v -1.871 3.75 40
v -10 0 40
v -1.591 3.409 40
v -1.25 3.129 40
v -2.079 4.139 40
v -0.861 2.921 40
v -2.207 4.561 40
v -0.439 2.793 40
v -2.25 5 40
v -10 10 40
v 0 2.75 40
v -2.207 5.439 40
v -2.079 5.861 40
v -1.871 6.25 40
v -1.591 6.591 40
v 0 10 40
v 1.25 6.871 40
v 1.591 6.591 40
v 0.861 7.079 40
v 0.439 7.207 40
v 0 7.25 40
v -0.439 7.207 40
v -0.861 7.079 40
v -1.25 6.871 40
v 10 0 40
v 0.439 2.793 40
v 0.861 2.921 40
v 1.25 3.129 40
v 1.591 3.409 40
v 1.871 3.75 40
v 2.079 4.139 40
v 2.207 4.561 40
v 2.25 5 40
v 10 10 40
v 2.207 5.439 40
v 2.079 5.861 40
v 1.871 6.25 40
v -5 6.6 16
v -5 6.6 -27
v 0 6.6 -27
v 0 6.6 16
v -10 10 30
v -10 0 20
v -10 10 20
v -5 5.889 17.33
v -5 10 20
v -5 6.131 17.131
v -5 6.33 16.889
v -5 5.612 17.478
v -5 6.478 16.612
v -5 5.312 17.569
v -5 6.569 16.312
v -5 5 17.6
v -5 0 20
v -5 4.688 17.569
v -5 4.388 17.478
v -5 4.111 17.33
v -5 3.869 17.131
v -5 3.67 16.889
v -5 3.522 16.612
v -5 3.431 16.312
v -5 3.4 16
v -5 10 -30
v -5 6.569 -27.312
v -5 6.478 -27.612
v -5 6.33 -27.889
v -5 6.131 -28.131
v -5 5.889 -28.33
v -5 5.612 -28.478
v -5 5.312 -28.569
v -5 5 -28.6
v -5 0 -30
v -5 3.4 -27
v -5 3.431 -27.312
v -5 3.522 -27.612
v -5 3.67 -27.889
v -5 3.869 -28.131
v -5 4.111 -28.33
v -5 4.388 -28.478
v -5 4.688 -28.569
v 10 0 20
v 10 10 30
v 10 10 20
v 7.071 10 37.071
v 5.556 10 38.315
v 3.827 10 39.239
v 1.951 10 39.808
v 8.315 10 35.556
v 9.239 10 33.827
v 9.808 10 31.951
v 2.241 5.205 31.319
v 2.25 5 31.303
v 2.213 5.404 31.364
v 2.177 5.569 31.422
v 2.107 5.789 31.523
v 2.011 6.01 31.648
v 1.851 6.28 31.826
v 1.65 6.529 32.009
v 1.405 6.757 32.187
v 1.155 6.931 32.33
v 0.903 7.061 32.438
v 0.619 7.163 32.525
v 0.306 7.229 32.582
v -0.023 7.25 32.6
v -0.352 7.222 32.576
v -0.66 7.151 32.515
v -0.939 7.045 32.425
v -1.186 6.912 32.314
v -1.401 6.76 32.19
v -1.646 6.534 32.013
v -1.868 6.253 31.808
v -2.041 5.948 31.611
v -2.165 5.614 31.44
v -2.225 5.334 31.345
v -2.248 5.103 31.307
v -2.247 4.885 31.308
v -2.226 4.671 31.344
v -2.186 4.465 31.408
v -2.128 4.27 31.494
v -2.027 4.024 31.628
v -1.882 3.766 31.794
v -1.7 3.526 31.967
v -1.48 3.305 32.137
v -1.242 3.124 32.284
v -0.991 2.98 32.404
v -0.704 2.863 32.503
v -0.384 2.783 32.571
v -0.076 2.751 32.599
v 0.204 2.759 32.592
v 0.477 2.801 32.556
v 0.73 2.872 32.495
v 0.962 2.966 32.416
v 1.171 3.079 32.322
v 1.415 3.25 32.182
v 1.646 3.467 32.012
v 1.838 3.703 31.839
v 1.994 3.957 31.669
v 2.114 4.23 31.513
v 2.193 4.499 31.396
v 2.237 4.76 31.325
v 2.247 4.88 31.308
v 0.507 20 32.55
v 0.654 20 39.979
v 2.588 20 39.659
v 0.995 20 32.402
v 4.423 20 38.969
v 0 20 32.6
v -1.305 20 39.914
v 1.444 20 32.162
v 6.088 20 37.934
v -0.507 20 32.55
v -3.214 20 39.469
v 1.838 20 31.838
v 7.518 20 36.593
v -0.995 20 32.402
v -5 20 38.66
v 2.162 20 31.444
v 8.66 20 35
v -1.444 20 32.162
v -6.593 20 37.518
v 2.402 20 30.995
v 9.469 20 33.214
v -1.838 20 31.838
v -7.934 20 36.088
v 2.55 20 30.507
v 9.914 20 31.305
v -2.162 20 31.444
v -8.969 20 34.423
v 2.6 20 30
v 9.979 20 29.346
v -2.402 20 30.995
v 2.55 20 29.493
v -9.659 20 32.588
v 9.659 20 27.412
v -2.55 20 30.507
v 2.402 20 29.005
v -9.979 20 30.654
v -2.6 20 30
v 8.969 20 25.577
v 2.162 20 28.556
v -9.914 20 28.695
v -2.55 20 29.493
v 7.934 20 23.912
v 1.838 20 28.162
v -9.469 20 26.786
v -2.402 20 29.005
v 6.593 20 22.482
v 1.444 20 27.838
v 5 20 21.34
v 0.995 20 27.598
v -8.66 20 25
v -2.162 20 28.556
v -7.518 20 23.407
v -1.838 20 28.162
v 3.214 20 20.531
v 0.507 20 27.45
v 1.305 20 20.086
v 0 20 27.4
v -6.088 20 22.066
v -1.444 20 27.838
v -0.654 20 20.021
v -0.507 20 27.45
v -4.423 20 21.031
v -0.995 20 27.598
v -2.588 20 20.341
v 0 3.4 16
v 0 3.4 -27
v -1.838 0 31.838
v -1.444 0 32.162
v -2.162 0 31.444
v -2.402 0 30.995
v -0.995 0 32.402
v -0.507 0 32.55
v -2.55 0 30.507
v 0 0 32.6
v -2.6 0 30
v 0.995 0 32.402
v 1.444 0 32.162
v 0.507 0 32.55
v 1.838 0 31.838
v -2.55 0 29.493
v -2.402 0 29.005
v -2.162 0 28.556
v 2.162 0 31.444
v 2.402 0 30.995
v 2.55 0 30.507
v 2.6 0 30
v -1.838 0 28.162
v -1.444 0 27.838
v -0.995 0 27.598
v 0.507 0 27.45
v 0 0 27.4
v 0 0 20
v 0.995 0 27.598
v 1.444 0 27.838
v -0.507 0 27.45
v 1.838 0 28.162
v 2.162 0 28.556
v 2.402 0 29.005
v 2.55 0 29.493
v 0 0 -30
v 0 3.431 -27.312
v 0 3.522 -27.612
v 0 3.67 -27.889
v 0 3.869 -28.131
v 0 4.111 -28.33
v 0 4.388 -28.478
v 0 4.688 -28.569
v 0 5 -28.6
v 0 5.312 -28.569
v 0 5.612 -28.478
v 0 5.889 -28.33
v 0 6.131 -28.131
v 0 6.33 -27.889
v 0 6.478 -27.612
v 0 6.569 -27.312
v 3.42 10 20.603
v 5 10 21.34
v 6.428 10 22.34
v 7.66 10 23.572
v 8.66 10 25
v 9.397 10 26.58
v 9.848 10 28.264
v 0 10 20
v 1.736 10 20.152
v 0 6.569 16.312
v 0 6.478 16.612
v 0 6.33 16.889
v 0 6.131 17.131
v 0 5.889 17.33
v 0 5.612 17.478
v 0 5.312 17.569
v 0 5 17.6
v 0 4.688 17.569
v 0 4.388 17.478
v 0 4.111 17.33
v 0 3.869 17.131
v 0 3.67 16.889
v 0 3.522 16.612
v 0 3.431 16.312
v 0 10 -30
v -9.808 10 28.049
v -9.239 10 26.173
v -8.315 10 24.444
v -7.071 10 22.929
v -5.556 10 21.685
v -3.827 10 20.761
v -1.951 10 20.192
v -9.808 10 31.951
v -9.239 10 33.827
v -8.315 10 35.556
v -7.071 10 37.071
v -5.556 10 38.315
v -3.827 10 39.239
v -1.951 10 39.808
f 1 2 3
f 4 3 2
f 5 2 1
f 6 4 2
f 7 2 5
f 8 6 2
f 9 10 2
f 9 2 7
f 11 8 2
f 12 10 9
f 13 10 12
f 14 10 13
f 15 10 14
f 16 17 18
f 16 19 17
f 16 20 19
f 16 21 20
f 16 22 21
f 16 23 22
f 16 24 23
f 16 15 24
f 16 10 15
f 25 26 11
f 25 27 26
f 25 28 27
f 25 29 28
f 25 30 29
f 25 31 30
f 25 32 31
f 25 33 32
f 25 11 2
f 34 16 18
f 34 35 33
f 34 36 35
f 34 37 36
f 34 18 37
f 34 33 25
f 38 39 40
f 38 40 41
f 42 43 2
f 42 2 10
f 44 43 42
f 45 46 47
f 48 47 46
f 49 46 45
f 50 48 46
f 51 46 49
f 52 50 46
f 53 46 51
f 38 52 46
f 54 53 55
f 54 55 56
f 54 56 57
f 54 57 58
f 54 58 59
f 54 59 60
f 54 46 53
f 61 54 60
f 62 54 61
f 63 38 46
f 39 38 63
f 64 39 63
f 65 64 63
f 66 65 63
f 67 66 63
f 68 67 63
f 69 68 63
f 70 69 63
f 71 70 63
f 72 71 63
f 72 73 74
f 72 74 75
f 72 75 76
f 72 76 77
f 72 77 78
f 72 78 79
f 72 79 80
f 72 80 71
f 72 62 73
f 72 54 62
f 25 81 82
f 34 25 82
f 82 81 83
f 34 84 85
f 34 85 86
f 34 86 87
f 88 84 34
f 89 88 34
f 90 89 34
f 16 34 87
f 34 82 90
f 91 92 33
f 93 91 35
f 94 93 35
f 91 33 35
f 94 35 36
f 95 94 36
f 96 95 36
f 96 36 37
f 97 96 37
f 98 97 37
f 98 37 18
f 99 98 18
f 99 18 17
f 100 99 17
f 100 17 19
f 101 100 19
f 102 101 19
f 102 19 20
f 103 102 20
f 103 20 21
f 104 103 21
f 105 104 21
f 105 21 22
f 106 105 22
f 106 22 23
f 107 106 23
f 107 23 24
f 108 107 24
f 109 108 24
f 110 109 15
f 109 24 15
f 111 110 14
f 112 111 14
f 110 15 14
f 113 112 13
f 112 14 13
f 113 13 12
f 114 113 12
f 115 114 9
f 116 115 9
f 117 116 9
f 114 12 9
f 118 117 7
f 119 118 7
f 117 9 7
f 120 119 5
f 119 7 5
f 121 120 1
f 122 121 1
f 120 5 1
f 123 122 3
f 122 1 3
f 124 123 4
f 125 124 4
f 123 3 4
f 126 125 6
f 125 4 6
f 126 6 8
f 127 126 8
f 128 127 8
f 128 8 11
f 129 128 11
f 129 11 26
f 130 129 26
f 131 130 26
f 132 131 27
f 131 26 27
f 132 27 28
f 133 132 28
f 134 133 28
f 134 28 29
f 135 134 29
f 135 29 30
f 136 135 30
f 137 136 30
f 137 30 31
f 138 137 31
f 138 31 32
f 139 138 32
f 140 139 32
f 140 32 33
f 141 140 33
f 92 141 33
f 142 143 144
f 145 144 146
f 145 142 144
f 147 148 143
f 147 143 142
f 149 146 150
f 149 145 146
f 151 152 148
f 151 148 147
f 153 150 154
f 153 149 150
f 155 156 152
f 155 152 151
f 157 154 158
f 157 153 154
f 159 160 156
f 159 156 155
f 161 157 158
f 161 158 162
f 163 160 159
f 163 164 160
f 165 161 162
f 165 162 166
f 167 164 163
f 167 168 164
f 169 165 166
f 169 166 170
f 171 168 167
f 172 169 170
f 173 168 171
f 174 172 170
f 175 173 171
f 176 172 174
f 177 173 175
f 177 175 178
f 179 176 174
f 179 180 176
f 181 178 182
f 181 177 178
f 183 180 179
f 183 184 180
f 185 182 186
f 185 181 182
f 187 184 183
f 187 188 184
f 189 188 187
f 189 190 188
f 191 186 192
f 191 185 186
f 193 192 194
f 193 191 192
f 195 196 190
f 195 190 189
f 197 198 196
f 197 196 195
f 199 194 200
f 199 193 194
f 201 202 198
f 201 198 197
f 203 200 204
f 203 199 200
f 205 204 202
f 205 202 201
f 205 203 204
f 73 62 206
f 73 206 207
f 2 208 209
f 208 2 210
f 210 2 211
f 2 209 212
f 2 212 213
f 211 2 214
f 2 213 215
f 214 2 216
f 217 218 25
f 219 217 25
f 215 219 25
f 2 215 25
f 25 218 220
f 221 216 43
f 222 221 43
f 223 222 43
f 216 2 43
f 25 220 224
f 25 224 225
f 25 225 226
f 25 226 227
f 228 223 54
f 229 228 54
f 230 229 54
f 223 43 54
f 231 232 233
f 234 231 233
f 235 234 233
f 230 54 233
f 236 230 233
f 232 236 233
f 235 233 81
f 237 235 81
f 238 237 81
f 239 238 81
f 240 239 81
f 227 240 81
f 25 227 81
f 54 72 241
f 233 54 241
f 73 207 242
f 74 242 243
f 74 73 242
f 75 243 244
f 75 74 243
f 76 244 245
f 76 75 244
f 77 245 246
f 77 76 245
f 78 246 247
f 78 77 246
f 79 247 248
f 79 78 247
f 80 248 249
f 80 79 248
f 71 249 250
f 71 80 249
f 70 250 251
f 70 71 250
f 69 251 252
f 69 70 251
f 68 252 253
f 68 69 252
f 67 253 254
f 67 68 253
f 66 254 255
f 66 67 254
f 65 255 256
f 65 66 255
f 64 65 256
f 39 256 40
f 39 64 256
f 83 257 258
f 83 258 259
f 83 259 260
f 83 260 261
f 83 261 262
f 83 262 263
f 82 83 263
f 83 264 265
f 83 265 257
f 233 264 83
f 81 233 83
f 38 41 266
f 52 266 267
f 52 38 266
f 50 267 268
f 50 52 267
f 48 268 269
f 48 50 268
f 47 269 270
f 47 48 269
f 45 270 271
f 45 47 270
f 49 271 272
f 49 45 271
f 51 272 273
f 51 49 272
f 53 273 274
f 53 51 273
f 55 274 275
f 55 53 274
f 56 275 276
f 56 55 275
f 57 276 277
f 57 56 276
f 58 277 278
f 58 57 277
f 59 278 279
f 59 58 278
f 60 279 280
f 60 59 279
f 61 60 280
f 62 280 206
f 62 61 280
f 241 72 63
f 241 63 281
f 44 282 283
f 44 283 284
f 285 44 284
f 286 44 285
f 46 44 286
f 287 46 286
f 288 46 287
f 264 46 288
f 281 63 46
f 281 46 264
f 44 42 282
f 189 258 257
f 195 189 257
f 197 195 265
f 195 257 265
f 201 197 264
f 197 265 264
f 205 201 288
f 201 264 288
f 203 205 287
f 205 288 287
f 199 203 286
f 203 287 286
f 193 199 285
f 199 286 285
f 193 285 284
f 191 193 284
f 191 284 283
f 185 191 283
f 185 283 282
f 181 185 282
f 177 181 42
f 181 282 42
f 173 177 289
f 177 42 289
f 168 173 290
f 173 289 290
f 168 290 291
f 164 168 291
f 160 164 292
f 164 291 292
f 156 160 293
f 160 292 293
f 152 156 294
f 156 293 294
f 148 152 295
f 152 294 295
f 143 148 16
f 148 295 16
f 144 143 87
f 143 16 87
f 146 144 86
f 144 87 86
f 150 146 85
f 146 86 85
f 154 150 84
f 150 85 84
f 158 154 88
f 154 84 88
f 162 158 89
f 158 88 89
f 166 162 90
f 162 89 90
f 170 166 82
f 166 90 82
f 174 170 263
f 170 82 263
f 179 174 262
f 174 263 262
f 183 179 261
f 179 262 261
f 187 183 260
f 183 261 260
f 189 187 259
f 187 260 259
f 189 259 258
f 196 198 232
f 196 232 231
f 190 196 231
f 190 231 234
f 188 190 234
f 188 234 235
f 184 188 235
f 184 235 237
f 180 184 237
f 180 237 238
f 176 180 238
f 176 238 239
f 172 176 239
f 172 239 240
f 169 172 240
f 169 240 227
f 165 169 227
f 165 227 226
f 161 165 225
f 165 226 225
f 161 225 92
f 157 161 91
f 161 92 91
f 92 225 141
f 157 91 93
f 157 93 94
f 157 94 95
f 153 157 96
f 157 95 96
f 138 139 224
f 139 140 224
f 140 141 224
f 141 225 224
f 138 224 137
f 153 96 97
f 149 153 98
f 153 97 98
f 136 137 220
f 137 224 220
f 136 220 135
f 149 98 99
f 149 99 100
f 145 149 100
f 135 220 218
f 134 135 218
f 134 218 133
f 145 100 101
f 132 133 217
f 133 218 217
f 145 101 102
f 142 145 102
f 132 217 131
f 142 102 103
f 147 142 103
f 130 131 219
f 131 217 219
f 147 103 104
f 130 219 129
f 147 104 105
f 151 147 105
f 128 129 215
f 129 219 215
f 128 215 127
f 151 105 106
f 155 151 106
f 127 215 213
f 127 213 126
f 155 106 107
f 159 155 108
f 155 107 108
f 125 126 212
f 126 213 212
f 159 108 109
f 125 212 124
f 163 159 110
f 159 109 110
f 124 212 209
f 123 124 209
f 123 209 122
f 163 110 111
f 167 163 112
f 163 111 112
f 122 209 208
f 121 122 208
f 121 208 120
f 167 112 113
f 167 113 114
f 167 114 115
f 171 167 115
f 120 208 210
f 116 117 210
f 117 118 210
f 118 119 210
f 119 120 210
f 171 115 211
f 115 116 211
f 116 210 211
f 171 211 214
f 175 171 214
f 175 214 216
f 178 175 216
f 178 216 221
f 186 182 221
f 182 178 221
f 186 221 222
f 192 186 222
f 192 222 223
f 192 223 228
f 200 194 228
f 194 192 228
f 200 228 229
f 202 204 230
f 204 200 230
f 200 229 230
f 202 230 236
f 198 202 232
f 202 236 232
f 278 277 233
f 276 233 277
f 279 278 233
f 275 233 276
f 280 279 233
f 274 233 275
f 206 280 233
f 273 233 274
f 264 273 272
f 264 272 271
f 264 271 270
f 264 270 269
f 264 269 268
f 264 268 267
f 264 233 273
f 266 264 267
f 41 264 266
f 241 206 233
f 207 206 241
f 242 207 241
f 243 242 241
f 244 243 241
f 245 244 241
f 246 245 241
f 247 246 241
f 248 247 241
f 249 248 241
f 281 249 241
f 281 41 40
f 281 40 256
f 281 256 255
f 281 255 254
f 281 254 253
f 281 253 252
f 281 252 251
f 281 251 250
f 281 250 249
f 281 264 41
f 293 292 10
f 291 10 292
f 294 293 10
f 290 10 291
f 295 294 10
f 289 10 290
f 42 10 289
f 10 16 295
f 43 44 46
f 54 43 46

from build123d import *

# Parameters (mm, degrees)
SKETCH_3_W          = 10
SKETCH_3_H          = 60
EXTRUDE_3_DEPTH     = 10
SKETCH_4_R          = 10
SKETCH_4_R_2        = 2.6
EXTRUDE_4_DEPTH     = 20
SKETCH_6_W          = 6
SKETCH_6_H          = 50
CUT_EXTRUDE_2_DEPTH = 43.426406871
CUT_EXTRUDE_3_DEPTH = 48.16990566
SKETCH_16_W         = 20
SKETCH_16_H         = 10
EXTRUDE_5_DEPTH     = 20
SKETCH_5_R          = 2.6
CUT_EXTRUDE_1_DEPTH = 46.82575695
SKETCH_18_R         = 2.25
CUT_EXTRUDE_4_DEPTH = 10


with BuildPart() as part:
    # 草图3 → 凸台-拉伸3 (new body)
    with BuildSketch(Plane(origin=(0, 0, 0), x_dir=(1, 0, 0), z_dir=(0, 1, 0))):
        Rectangle(SKETCH_3_W, SKETCH_3_H)
    extrude(amount=EXTRUDE_3_DEPTH)

    # 草图4 → 凸台-拉伸4 (add)
    with BuildSketch(Plane(origin=(0, 0, 0), x_dir=(1, 0, 0), z_dir=(0, 1, 0))):
        with Locations(Location((0, -30, 0), (0, 0, 60))):
            Circle(SKETCH_4_R)
        with Locations(Location((0, -30, 0), (0, 0, 180))):
            Circle(SKETCH_4_R_2, mode=Mode.SUBTRACT)
    extrude(amount=EXTRUDE_4_DEPTH)

    # 草图6 → 切除-拉伸2 (cut, through all)
    with BuildSketch(Plane(origin=(0, 10, 0), x_dir=(1, 0, 0), z_dir=(0, 1, 0))):
        with Locations((3, 5)):
            Rectangle(SKETCH_6_W, SKETCH_6_H)
    extrude(amount=-CUT_EXTRUDE_2_DEPTH, mode=Mode.SUBTRACT)

    # 草图7 → 切除-拉伸3 (cut, through all)
    with BuildSketch(Plane.ZY.offset(5)):
        with BuildLine():
            Line((-27, 6.6), (16, 6.6))
            ThreePointArc((16, 6.6), (17.6, 5), (16, 3.4))
            Line((16, 3.4), (-27, 3.4))
            ThreePointArc((-27, 3.4), (-28.6, 5), (-27, 6.6))
        make_face()
    extrude(amount=-CUT_EXTRUDE_3_DEPTH, mode=Mode.SUBTRACT)

    # 草图16 → 凸台-拉伸5 (add)
    with BuildSketch(Plane.XY.offset(20)):
        with Locations((0, 5)):
            Rectangle(SKETCH_16_W, SKETCH_16_H)
    extrude(amount=EXTRUDE_5_DEPTH)

    # 草图5 → 切除-拉伸1 (cut, through all)
    with BuildSketch(Plane.XZ):
        with Locations(Location((0, 30, 0), (0, 0, 270))):
            Circle(SKETCH_5_R)
    extrude(amount=-CUT_EXTRUDE_1_DEPTH, mode=Mode.SUBTRACT)

    # 草图18 → 切除-拉伸4 (cut)
    with BuildSketch(Plane.XY.offset(40)):
        with Locations((0, 5)):
            Circle(SKETCH_18_R)
    extrude(amount=-CUT_EXTRUDE_4_DEPTH, mode=Mode.SUBTRACT)


solid = part.part
